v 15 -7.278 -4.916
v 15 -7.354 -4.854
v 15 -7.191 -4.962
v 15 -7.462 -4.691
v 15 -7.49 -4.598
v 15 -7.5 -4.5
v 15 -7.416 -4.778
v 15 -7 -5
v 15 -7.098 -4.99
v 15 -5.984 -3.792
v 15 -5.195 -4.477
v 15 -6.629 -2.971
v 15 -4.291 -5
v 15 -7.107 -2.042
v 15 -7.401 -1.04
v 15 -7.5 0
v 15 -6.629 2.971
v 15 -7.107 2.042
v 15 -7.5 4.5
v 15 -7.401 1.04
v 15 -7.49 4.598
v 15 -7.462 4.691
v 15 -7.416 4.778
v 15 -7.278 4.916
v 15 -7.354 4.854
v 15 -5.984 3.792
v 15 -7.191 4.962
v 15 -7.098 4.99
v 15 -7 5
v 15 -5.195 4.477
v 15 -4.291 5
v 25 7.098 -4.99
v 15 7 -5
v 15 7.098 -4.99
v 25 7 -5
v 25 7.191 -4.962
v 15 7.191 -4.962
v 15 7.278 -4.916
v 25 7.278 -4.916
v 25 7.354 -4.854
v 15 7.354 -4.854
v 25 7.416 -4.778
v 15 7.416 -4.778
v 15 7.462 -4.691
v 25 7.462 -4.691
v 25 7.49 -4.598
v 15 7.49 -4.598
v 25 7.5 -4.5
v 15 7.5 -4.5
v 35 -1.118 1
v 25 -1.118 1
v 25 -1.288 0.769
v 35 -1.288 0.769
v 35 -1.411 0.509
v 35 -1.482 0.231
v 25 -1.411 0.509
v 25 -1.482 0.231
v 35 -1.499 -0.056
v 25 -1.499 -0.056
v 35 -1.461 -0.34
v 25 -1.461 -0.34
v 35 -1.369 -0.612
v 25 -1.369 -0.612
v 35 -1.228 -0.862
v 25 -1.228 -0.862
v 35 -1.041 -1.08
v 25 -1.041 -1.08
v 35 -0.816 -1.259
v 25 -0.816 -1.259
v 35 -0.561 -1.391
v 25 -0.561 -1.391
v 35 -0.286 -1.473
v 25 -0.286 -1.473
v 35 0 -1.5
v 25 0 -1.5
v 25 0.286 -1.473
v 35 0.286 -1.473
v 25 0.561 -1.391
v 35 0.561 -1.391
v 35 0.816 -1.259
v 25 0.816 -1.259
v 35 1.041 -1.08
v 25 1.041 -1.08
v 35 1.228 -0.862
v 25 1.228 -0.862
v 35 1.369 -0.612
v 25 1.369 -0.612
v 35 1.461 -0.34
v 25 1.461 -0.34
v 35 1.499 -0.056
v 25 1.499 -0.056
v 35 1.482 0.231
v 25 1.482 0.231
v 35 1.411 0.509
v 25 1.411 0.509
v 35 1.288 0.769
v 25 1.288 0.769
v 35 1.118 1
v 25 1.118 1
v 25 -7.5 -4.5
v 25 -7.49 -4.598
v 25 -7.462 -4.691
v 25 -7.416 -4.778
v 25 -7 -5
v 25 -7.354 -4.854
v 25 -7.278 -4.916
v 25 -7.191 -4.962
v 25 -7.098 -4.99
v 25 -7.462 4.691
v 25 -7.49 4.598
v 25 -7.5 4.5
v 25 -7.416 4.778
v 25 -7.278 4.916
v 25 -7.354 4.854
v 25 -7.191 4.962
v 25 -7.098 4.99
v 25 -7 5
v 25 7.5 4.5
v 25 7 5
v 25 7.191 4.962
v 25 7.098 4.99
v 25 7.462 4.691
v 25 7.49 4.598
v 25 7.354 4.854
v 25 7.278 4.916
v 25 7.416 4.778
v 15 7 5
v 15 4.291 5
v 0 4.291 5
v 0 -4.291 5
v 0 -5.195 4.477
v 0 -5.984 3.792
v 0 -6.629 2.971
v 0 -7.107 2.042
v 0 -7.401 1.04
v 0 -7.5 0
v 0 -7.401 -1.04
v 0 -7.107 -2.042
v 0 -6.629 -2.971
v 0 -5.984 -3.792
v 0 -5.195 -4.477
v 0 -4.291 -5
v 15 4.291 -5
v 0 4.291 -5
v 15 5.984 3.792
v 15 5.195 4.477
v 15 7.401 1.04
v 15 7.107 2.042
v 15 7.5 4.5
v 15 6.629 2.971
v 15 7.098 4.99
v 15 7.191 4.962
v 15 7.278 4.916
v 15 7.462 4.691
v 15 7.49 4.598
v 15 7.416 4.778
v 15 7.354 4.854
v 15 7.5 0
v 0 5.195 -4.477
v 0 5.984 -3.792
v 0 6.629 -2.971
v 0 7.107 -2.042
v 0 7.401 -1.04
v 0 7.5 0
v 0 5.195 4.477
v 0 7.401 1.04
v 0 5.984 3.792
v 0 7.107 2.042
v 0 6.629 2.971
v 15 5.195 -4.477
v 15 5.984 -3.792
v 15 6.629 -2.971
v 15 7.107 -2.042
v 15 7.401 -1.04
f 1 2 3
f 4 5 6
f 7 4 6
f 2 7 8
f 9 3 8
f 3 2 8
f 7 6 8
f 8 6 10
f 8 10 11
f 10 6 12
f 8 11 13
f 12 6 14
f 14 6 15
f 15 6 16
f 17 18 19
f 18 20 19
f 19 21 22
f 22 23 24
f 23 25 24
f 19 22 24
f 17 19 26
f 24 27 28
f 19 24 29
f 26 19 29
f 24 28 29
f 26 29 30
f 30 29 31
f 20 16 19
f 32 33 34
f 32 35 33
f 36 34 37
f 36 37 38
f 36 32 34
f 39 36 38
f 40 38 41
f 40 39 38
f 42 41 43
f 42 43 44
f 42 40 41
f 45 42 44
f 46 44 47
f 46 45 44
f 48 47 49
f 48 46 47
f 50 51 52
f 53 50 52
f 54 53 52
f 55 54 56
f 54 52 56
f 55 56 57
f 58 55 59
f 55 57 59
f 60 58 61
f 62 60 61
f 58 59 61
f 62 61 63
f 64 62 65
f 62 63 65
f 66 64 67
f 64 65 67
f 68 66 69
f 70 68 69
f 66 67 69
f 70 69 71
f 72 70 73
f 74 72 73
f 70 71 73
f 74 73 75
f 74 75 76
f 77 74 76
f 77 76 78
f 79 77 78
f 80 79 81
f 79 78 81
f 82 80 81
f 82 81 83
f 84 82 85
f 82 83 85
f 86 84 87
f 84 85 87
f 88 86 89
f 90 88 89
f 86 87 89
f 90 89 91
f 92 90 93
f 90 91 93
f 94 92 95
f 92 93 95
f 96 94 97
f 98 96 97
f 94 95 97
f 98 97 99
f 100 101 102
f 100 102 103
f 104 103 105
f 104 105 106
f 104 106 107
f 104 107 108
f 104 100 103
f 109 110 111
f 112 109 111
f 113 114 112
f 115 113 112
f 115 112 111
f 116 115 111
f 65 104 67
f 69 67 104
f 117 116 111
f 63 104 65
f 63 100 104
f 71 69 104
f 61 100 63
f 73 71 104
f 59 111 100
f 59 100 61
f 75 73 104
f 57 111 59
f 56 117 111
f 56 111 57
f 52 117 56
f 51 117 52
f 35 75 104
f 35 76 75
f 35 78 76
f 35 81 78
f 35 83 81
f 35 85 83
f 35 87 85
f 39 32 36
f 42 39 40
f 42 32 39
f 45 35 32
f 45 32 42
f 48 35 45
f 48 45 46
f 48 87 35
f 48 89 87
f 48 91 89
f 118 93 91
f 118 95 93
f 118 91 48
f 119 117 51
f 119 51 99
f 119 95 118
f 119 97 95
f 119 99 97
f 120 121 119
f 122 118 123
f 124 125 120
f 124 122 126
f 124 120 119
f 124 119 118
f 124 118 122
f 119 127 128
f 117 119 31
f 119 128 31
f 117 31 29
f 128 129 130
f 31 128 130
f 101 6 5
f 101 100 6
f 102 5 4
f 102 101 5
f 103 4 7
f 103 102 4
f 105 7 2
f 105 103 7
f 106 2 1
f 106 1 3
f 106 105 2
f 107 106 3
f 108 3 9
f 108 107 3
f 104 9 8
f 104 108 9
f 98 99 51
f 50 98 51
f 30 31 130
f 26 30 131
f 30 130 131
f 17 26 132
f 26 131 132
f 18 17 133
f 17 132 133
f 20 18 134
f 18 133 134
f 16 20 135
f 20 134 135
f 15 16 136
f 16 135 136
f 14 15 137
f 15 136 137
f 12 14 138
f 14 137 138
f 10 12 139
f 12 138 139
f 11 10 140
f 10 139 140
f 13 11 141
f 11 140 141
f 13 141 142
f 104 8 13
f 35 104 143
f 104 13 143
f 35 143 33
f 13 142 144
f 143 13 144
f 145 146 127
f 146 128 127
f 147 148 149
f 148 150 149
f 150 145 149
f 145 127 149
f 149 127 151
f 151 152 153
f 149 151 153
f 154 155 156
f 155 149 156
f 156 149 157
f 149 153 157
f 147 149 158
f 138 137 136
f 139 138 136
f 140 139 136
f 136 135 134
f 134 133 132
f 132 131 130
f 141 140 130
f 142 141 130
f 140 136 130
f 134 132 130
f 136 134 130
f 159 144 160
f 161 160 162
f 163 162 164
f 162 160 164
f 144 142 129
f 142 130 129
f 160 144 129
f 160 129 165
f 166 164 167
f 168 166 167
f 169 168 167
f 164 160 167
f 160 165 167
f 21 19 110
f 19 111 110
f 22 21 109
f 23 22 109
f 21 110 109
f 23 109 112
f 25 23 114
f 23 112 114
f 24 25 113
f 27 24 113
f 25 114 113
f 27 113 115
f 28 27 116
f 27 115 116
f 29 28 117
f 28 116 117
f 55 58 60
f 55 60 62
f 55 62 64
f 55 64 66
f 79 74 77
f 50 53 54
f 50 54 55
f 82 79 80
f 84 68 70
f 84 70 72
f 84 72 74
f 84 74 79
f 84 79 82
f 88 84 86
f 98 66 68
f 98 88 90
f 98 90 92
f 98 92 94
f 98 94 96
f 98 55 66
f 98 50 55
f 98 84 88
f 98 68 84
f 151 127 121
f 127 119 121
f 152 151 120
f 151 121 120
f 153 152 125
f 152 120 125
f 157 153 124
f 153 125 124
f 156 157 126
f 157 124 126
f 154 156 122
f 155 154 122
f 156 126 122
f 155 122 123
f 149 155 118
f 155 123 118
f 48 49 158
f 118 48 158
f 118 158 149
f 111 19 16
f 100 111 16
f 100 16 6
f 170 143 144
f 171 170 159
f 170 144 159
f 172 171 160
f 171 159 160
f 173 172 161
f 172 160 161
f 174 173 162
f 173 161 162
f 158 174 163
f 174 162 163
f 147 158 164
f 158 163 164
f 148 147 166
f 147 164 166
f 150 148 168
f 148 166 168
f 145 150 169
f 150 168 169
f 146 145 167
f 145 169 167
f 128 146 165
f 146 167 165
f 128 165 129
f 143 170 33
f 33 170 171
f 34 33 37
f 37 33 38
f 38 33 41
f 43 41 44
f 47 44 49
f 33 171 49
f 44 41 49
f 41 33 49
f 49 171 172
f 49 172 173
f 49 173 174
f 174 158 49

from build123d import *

# Parameters (mm, degrees)
F1_DEPTH = 15
F3_DEPTH = 10
F4_R     = 0.5
F6_DEPTH = 10


with BuildPart() as f1:
    # F0 (on Right) → F1 (new body)
    with BuildSketch(Plane.YZ):
        with BuildLine():
            Line((4.2912878475, 5), (-4.2912878475, 5))
            ThreePointArc((-4.2912878475, 5), (-7.5, 0), (-4.2912878475, -5))
            Line((-4.2912878475, -5), (4.2912878475, -5))
            ThreePointArc((4.2912878475, -5), (7.5, 0), (4.2912878475, 5))
        make_face()
    extrude(amount=F1_DEPTH)

    # F2 (on face) → F3 (join)
    with BuildSketch(Plane.YZ.offset(15)):
        with BuildLine():
            Line((-4.2912878475, 5), (-7.5, 5))
            Line((-7.5, 5), (-7.5, 0))
            ThreePointArc((-7.5, 0), (-6.628827236, 2.9705148408), (-4.2912878475, 5))
        make_face()
        with BuildLine():
            Line((7.5, 5), (4.2912878475, 5))
            ThreePointArc((4.2912878475, 5), (6.628827236, 2.9705148408), (7.5, 0))
            Line((7.5, 0), (7.5, 5))
        make_face()
        with BuildLine():
            Line((4.2912878475, 5), (-4.2912878475, 5))
            ThreePointArc((-4.2912878475, 5), (-6.628827236, 2.9705148408), (-7.5, 0))
            ThreePointArc((-7.5, 0), (-6.628827236, -2.9705148408), (-4.2912878475, -5))
            Line((-4.2912878475, -5), (4.2912878475, -5))
            ThreePointArc((4.2912878475, -5), (6.628827236, -2.9705148408), (7.5, 0))
            ThreePointArc((7.5, 0), (6.628827236, 2.9705148408), (4.2912878475, 5))
        make_face()
        with BuildLine():
            ThreePointArc((-4.2912878475, -5), (-6.628827236, -2.9705148408), (-7.5, 0))
            Line((-7.5, 0), (-7.5, -5))
            Line((-7.5, -5), (-4.2912878475, -5))
        make_face()
        with BuildLine():
            Line((7.5, -5), (7.5, 0))
            ThreePointArc((7.5, 0), (6.628827236, -2.9705148408), (4.2912878475, -5))
            Line((4.2912878475, -5), (7.5, -5))
        make_face()
    extrude(amount=F3_DEPTH)

    # F4
    f4_edges = [f1.edges().sort_by_distance(p)[0] for p in [
        (20, -7.5, 5),
        (20, 7.5, 5),
        (20, -7.5, -5),
        (20, 7.5, -5),
    ]]
    fillet(f4_edges, radius=F4_R)

    # F5 (on face) → F6 (join)
    with BuildSketch(Plane.YZ.offset(25)):
        with BuildLine():
            Line((1.1180339887, 1), (-1.1180339887, 1))
            ThreePointArc((-1.1180339887, 1), (0, -1.5), (1.1180339887, 1))
        make_face()
    extrude(amount=F6_DEPTH)


solid = f1.part
